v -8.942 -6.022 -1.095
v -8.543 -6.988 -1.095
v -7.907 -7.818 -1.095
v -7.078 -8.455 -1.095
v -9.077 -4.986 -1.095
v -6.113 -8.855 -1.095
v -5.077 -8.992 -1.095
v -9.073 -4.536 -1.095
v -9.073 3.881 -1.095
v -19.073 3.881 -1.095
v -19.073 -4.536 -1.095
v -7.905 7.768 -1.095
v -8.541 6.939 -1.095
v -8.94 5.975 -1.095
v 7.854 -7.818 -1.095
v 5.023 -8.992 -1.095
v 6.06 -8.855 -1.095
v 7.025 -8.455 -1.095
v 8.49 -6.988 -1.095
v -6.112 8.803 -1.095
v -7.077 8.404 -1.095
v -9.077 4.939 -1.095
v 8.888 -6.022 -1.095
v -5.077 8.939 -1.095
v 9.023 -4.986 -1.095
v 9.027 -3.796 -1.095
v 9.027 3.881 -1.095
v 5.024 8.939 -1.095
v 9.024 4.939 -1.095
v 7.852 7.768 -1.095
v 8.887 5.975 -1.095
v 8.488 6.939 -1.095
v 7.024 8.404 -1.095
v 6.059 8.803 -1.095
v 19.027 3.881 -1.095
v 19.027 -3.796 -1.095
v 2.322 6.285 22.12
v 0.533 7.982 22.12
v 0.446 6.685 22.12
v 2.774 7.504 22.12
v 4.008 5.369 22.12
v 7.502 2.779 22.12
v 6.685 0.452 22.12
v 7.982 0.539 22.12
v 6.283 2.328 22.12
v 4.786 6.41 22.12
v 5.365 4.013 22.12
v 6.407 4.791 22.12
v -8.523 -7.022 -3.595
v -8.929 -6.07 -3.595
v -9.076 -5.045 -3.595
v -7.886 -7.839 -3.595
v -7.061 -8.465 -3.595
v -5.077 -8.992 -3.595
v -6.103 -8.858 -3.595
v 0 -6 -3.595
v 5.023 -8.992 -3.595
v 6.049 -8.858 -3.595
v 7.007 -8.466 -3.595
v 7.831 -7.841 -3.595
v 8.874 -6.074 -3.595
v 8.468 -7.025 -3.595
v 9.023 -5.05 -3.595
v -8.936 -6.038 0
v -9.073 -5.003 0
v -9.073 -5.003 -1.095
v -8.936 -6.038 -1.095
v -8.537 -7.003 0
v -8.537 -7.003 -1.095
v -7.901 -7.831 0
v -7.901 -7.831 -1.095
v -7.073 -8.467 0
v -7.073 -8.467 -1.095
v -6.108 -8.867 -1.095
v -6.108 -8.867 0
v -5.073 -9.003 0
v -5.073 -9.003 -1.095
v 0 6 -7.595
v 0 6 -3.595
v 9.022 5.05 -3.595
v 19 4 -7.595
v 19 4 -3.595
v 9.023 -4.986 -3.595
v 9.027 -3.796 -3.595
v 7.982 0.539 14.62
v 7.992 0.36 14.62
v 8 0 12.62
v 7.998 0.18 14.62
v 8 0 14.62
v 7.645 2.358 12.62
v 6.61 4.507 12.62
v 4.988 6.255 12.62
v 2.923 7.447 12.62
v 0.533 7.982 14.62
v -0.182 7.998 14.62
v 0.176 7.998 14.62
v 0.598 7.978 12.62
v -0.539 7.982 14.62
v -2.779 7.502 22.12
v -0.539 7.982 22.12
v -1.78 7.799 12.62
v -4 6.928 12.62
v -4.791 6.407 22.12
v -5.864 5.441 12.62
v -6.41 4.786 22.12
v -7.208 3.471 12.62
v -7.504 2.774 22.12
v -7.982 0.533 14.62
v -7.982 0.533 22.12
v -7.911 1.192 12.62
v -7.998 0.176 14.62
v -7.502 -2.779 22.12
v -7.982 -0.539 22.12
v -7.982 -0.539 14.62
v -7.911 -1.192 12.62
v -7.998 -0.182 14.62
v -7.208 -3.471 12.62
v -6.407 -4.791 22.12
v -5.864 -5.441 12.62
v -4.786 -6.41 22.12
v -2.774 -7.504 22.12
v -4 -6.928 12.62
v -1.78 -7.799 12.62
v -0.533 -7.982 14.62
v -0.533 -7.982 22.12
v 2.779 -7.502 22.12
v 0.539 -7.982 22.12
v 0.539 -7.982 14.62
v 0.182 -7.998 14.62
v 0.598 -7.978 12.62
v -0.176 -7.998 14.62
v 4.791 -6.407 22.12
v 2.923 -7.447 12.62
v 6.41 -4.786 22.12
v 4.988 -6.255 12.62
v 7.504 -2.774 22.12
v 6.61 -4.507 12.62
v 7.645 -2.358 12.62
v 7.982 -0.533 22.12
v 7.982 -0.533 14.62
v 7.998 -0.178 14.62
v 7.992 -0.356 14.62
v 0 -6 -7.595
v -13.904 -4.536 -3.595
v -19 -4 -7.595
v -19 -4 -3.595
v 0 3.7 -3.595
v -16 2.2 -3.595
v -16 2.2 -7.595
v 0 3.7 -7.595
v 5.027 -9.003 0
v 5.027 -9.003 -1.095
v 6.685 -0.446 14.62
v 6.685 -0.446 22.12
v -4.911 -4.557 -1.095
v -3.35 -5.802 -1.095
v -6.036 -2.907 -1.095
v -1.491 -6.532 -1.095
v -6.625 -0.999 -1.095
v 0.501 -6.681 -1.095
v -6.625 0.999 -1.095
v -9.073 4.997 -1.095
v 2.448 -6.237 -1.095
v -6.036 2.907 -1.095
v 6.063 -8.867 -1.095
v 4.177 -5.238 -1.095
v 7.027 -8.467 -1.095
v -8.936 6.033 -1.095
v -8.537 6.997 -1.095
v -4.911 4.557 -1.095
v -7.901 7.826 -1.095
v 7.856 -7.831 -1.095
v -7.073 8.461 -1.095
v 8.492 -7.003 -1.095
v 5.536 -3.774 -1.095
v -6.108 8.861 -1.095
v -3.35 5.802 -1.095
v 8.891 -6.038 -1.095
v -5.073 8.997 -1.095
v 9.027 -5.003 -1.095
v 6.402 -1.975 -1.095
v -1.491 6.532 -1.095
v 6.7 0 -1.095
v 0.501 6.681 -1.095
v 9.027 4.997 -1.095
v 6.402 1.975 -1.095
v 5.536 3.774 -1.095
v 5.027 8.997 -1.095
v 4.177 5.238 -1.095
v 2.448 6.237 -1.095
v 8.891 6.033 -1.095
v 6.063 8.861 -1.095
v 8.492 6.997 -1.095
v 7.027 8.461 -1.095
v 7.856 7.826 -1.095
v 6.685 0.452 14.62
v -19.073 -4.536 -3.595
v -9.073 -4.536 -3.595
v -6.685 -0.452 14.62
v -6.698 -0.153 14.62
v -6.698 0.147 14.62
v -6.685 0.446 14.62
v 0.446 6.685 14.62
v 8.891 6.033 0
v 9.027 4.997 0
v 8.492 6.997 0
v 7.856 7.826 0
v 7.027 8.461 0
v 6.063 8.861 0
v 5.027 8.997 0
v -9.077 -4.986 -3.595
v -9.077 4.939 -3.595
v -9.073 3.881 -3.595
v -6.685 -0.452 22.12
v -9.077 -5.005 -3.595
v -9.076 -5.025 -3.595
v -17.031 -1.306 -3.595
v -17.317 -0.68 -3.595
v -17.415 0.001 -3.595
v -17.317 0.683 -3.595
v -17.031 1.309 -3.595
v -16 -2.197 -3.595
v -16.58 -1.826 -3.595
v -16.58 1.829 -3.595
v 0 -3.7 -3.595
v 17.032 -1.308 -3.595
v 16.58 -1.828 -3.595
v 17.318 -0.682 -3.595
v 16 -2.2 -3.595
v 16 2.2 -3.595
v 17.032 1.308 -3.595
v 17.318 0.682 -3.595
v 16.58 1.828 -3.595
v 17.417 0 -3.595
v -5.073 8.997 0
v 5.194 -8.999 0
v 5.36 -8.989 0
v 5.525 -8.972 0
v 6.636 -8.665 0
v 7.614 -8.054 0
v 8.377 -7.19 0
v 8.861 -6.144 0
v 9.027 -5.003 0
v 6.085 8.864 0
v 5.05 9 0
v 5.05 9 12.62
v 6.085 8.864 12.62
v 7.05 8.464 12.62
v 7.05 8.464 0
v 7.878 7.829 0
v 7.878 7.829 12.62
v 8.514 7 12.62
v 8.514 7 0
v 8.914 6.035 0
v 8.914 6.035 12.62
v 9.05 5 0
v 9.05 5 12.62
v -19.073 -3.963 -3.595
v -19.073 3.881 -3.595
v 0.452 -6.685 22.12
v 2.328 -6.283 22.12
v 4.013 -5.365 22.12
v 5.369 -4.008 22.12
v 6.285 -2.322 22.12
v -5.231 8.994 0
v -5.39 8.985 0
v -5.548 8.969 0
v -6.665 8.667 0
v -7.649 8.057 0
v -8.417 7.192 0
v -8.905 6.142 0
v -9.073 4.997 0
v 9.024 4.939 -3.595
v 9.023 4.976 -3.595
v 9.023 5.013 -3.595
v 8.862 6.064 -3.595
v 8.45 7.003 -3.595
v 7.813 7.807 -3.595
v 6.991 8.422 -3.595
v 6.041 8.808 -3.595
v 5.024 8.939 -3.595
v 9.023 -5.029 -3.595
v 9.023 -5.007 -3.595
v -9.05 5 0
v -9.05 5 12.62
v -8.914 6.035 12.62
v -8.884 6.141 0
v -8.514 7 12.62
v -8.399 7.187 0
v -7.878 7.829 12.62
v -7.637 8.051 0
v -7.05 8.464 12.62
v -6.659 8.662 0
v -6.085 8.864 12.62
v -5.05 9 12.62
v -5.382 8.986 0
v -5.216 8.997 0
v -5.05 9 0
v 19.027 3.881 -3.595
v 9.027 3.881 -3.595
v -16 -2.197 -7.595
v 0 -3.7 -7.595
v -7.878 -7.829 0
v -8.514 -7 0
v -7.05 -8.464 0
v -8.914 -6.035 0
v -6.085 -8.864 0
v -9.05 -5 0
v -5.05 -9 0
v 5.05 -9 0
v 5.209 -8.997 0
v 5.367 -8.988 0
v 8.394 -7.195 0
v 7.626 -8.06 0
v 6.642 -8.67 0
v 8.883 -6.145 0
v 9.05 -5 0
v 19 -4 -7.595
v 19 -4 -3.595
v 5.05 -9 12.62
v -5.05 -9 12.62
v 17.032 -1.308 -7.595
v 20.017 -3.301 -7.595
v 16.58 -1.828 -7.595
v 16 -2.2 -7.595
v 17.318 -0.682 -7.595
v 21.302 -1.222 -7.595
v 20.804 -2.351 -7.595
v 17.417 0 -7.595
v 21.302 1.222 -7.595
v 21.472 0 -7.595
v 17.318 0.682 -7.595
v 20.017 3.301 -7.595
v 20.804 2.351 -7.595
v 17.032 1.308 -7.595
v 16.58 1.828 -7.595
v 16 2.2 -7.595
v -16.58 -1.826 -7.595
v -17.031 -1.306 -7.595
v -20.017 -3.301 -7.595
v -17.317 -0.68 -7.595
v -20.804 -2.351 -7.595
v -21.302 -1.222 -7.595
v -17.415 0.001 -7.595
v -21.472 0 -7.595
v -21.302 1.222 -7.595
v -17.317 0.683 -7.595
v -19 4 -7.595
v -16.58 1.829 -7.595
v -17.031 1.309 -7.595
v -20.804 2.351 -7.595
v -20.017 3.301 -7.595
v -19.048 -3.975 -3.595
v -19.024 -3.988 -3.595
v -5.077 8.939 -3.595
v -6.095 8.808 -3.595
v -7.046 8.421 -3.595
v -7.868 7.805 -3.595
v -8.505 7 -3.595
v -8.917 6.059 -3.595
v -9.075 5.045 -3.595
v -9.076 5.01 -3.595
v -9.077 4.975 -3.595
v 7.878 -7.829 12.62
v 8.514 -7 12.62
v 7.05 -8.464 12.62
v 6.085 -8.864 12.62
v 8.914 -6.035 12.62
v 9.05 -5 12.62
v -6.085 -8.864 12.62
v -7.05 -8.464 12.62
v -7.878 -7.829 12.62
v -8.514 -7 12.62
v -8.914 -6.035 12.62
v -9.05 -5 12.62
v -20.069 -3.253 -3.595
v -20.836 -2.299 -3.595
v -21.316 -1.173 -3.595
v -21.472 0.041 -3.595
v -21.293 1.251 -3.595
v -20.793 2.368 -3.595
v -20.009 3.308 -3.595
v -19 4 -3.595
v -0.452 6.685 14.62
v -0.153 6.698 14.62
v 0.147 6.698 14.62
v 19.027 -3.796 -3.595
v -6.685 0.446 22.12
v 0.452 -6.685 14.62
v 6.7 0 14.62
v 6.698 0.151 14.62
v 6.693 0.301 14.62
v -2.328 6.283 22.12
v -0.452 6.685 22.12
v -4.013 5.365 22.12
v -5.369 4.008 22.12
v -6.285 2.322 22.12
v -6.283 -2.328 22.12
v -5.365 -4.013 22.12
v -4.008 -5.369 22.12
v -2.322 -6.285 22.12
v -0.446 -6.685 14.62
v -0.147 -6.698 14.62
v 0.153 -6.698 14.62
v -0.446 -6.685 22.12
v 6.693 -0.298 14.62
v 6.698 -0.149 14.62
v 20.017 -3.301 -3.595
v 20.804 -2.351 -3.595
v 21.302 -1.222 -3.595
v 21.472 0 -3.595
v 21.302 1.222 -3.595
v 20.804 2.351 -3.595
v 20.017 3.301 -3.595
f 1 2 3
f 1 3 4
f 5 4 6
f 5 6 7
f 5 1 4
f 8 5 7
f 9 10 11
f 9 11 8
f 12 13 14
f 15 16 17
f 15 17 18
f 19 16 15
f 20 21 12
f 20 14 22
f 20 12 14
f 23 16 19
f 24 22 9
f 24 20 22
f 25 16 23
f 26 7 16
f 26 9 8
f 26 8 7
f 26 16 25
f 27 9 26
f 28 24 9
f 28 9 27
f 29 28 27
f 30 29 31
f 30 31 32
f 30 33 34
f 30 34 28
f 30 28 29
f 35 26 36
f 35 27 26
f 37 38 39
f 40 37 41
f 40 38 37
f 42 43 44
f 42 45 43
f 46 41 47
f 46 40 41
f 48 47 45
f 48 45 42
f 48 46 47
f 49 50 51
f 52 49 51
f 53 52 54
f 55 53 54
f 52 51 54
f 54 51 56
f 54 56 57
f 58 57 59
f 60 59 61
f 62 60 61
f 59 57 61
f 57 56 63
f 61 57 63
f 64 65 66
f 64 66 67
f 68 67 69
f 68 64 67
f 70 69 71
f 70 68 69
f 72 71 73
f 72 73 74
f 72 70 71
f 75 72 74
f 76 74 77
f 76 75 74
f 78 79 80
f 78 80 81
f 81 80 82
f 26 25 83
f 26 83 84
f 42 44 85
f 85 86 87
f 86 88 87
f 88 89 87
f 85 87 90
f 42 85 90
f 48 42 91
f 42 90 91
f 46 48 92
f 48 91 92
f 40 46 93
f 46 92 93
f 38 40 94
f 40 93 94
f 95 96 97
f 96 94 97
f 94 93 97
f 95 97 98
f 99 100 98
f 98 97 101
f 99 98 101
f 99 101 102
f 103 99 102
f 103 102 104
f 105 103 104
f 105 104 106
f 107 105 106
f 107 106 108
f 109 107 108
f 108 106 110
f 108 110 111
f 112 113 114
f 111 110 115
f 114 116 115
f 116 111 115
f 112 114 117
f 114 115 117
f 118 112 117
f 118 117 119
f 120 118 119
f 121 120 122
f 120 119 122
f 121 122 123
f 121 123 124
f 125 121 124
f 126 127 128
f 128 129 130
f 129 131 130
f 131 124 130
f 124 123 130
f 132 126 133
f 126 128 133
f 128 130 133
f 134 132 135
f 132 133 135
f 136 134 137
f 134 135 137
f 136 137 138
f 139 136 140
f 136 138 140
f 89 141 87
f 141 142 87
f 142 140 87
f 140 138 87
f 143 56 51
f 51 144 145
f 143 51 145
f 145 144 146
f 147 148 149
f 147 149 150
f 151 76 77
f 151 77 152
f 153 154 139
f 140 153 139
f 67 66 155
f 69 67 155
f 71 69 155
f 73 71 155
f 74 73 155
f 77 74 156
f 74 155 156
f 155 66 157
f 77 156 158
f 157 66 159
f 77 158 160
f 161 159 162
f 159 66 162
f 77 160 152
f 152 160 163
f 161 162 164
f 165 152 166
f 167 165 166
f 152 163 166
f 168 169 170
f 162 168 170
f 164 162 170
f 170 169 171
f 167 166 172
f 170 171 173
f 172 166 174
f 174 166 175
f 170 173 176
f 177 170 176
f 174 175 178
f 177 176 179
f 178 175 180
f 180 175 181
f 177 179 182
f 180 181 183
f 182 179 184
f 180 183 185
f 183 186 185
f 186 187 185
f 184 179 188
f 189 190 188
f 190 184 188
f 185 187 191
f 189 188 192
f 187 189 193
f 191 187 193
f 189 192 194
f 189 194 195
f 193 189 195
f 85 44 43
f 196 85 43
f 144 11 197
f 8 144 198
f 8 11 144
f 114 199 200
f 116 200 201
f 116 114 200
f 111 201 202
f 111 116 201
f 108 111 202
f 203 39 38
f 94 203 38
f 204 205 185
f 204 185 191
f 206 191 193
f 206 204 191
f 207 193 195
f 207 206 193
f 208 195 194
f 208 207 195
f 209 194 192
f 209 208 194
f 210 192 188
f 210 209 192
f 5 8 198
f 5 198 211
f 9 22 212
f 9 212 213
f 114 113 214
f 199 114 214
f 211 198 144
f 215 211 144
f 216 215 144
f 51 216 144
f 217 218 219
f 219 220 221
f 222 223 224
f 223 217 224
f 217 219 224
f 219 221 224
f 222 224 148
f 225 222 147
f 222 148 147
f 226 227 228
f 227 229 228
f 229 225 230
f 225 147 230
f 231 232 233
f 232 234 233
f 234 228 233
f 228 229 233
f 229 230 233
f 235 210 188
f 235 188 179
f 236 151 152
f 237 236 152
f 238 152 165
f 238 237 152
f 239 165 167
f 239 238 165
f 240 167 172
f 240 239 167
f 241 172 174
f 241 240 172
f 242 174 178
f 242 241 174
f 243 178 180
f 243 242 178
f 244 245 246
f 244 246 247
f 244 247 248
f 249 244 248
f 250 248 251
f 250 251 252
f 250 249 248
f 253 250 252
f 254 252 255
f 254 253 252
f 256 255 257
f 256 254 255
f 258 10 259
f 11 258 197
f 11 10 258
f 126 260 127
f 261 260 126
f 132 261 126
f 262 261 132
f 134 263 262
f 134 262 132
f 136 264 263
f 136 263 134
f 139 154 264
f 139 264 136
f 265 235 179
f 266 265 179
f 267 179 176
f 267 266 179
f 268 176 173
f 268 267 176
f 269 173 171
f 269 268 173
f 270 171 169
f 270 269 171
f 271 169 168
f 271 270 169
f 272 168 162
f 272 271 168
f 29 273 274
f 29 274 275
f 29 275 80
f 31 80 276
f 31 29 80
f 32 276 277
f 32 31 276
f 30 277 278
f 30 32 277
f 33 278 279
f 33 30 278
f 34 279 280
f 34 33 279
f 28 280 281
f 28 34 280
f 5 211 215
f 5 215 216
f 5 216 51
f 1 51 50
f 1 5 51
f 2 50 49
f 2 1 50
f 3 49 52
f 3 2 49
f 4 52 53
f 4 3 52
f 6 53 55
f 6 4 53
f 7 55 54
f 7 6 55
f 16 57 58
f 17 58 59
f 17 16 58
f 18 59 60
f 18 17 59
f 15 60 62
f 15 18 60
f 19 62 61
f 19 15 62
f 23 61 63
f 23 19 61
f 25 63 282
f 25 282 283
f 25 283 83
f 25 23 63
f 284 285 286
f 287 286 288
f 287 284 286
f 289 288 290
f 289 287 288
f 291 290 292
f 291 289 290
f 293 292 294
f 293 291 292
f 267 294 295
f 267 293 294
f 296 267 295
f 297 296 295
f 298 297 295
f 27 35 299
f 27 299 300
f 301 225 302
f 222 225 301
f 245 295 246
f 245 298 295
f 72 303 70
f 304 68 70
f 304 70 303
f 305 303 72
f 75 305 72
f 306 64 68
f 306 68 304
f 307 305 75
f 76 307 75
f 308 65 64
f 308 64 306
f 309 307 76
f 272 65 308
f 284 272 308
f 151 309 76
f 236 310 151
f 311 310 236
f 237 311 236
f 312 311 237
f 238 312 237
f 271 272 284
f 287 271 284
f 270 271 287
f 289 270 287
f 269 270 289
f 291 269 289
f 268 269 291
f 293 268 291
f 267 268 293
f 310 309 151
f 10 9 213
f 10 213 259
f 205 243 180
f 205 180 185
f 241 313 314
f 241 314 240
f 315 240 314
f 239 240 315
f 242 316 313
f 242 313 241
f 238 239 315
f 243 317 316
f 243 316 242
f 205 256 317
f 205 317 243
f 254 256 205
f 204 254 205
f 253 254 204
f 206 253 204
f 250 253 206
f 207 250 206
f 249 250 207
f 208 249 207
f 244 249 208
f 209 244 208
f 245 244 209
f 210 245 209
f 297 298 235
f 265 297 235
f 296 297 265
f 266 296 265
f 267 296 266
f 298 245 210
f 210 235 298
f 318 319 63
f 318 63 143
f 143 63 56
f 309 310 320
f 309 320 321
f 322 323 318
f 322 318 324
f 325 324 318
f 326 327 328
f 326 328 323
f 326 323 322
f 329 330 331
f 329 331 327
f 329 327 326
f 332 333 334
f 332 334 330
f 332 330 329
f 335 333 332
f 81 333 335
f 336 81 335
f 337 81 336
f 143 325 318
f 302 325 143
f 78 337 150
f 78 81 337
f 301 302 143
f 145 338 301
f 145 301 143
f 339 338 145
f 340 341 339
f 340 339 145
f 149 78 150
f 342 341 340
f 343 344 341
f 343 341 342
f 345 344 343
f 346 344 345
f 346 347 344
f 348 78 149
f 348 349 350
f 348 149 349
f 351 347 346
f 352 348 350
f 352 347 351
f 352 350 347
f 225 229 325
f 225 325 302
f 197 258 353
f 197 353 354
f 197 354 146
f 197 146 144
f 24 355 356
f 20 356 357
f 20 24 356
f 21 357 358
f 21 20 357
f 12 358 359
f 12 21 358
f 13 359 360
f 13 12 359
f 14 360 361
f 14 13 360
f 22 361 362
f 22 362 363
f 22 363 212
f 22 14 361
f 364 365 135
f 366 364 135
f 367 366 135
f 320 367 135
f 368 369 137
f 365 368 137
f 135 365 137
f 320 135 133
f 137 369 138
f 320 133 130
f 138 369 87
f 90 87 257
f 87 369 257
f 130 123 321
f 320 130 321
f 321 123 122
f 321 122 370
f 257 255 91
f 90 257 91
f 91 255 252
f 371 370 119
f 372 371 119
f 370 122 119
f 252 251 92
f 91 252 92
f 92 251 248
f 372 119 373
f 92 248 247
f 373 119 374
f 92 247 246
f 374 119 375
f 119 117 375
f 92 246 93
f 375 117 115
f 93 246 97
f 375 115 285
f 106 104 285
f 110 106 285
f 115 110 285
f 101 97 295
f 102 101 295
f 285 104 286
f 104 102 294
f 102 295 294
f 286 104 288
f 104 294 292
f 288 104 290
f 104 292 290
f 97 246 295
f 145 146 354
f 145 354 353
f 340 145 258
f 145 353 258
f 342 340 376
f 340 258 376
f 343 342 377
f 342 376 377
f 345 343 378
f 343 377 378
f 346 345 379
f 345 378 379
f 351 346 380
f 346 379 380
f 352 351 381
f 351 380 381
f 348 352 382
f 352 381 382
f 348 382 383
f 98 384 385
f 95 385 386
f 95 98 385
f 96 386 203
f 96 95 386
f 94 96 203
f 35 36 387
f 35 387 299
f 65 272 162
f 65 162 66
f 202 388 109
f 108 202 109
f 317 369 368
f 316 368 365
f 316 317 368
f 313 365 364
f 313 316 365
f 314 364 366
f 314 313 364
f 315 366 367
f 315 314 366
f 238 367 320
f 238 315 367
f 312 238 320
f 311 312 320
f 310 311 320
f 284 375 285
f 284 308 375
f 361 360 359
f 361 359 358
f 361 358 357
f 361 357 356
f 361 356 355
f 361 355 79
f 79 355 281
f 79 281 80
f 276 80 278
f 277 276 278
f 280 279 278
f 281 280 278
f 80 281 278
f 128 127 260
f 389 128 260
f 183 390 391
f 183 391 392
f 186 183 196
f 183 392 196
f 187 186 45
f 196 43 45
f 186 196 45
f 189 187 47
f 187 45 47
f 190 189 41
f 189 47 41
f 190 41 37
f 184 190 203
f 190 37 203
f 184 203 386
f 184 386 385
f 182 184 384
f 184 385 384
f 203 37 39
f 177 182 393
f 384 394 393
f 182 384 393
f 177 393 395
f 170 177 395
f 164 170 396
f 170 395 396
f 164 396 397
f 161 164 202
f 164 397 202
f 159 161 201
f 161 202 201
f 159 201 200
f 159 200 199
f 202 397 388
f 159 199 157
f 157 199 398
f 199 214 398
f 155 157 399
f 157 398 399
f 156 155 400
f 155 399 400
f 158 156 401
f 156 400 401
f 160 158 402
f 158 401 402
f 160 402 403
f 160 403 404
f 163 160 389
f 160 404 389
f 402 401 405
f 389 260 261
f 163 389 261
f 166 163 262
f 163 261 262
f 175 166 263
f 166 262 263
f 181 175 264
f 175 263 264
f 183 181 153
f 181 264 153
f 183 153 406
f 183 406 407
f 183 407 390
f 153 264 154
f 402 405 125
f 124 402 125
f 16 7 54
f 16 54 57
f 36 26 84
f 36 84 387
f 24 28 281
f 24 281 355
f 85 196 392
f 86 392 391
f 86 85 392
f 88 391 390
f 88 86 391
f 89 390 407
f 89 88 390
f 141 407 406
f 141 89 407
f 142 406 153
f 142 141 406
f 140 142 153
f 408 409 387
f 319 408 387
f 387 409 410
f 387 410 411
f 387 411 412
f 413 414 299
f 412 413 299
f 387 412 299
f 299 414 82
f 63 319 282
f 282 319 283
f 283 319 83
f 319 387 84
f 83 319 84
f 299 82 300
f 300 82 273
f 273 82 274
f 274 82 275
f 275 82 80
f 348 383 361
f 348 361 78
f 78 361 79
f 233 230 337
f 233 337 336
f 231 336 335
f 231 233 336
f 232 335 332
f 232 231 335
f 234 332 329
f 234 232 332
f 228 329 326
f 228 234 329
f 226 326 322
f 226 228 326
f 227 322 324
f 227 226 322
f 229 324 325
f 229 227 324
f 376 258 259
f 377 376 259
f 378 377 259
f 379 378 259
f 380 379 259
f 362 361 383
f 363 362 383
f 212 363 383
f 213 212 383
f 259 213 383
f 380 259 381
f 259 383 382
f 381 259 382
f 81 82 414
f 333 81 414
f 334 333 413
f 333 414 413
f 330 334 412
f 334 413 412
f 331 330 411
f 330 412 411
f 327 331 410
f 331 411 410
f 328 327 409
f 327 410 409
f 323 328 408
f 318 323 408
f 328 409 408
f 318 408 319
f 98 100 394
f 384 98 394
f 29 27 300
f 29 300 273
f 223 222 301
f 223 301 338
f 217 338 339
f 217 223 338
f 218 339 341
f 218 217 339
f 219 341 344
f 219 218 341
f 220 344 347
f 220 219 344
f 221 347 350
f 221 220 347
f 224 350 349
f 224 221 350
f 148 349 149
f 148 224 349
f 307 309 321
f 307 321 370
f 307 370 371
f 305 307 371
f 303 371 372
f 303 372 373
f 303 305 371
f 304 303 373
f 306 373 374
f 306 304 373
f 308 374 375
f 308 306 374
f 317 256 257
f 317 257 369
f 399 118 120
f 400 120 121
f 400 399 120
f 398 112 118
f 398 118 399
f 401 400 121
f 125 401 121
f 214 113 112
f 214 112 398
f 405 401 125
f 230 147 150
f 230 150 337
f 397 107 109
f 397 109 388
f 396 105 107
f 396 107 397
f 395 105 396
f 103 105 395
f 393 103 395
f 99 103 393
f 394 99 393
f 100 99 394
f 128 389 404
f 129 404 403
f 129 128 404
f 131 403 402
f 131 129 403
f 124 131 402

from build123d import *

# Parameters (mm, degrees)
BOSS_EXTRUDE1_DEPTH = 2
BOSS_EXTRUDE2_DEPTH = 11.02
BOSS_EXTRUDE3_DEPTH = 1.6
SKETCH4_R           = 8
BOSS_EXTRUDE4_DEPTH = 9.5
SKETCH5_R           = 6.65
CUT_EXTRUDE1_DEPTH  = 20
BOSS_EXTRUDE5_DEPTH = 1.095
SKETCH13_R          = 6.7
CUT_EXTRUDE3_DEPTH  = 30
CUT_EXTRUDE4_DEPTH  = 7.5
CIRPATTERN2_COUNT   = 4
BOSS_EXTRUDE6_DEPTH = 2.5
BOSS_EXTRUDE7_DEPTH = 4


with BuildPart() as part:
    # Sketch1 → Boss-Extrude1 (new body)
    with BuildSketch(Plane.XY):
        with BuildLine():
            Line((-5.05, 9.000108401), (5.05, 9.000108401))
            ThreePointArc((5.05, 9.000108401), (7.878427125, 7.828535526), (9.05, 5.000108401))
            Line((9.05, 5.000108401), (9.05, -5.000108401))
            ThreePointArc((9.05, -5.000108401), (7.878427125, -7.828535526), (5.05, -9.000108401))
            Line((5.05, -9.000108401), (-5.05, -9.000108401))
            ThreePointArc((-5.05, -9.000108401), (-7.878427125, -7.828535526), (-9.05, -5.000108401))
            Line((-9.05, -5.000108401), (-9.05, 5.000108401))
            ThreePointArc((-9.05, 5.000108401), (-7.878427125, 7.828535526), (-5.05, 9.000108401))
        make_face()
    extrude(amount=BOSS_EXTRUDE1_DEPTH)

    # Sketch2 → Boss-Extrude2 (add)
    with BuildSketch(Plane.XY):
        with BuildLine():
            Line((-5.05, 9.000108401), (5.05, 9.000108401))
            ThreePointArc((5.05, 9.000108401), (7.878427125, 7.828535526), (9.05, 5.000108401))
            Line((9.05, 5.000108401), (9.05, -5.000108401))
            ThreePointArc((9.05, -5.000108401), (7.878427125, -7.828535526), (5.05, -9.000108401))
            Line((5.05, -9.000108401), (-5.05, -9.000108401))
            ThreePointArc((-5.05, -9.000108401), (-7.878427125, -7.828535526), (-9.05, -5.000108401))
            Line((-9.05, -5.000108401), (-9.05, 5.000108401))
            ThreePointArc((-9.05, 5.000108401), (-7.878427125, 7.828535526), (-5.05, 9.000108401))
        make_face()
    extrude(amount=BOSS_EXTRUDE2_DEPTH)

    # Sketch3 → Boss-Extrude3 (add)
    with BuildSketch(Plane.XY.offset(11.02)):
        with BuildLine():
            Line((-5.05, 9.000108401), (5.05, 9.000108401))
            ThreePointArc((5.05, 9.000108401), (7.878427125, 7.828535526), (9.05, 5.000108401))
            Line((9.05, 5.000108401), (9.05, -5.000108401))
            ThreePointArc((9.05, -5.000108401), (7.878427125, -7.828535526), (5.05, -9.000108401))
            Line((5.05, -9.000108401), (-5.05, -9.000108401))
            ThreePointArc((-5.05, -9.000108401), (-7.878427125, -7.828535526), (-9.05, -5.000108401))
            Line((-9.05, -5.000108401), (-9.05, 5.000108401))
            ThreePointArc((-9.05, 5.000108401), (-7.878427125, 7.828535526), (-5.05, 9.000108401))
        make_face()
    extrude(amount=BOSS_EXTRUDE3_DEPTH)

    # Sketch4 → Boss-Extrude4 (add)
    with BuildSketch(Plane.XY.offset(12.62)):
        Circle(SKETCH4_R)
    extrude(amount=BOSS_EXTRUDE4_DEPTH)

    # Sketch5 → Cut-Extrude1 (cut)
    with BuildSketch(Plane.XY.offset(12.62)):
        Circle(SKETCH5_R)
    extrude(amount=CUT_EXTRUDE1_DEPTH, mode=Mode.SUBTRACT)

    # Sketch12 → Boss-Extrude5 (add)
    with BuildSketch(Plane(origin=(0, 0, 0), x_dir=(-1, 0, 0), z_dir=(0, 0, -1))):
        with BuildLine():
            Line((-5.027404416, 8.997340309), (5.072595584, 8.997340309))
            ThreePointArc((5.072595584, 8.997340309), (7.901022709, 7.825767433), (9.072595584, 4.997340309))
            Line((9.072595584, 4.997340309), (9.072595584, -5.002876493))
            ThreePointArc((9.072595584, -5.002876493), (7.901022709, -7.831303618), (5.072595584, -9.002876493))
            Line((5.072595584, -9.002876493), (-5.027404416, -9.002876493))
            ThreePointArc((-5.027404416, -9.002876493), (-7.85583154, -7.831303618), (-9.027404416, -5.002876493))
            Line((-9.027404416, -5.002876493), (-9.027404416, 4.997340309))
            ThreePointArc((-9.027404416, 4.997340309), (-7.85583154, 7.825767433), (-5.027404416, 8.997340309))
        make_face()
    extrude(amount=BOSS_EXTRUDE5_DEPTH)

    # Sketch13 → Cut-Extrude3 (cut, symmetric)
    with BuildSketch(Plane.XY):
        Circle(SKETCH13_R)
    extrude(amount=CUT_EXTRUDE3_DEPTH, both=True, mode=Mode.SUBTRACT)

    # Sketch15 → Cut-Extrude4 (cut)
    with BuildSketch(Plane.XY.offset(22.12)):
        Polygon((-0.552830798, 8.187091014), (-0.002830798, 0.003314653), (0.547169202, 8.187091014), (0.617169202, 9.000108401), (-0.626042329, 9.000108401), align=None)
    cut_extrude4 = extrude(amount=-CUT_EXTRUDE4_DEPTH, mode=Mode.SUBTRACT)

    # CirPattern2: Cut-Extrude4 ×4 about axis
    cirpattern2_axis = Axis((0, 0, 0), (0, 0, 1))
    for i in range(1, CIRPATTERN2_COUNT):
        add(cut_extrude4.rotate(cirpattern2_axis, i * 360 / CIRPATTERN2_COUNT), mode=Mode.SUBTRACT)


with BuildPart() as body_2:
    # Sketch16 → Boss-Extrude6 (new body)
    with BuildSketch(Plane(origin=(0, 0, -1.095), x_dir=(-1, 0, 0), z_dir=(0, 0, -1))):
        with BuildLine():
            Line((-5.0235757, 8.939451881), (5.076696464, 8.939451881))
            ThreePointArc((5.076696464, 8.939451881), (7.905123589, 7.767879006), (9.076696464, 4.939451881))
            Line((9.076696464, 4.939451881), (9.072595584, 3.880790969))
            Line((9.072595584, 3.880790969), (19.072595584, 3.880790969))
            Line((19.072595584, 3.880790969), (19.072595584, -4.536431038))
            Line((19.072595584, -4.536431038), (9.072595584, -4.536431038))
            Line((9.072595584, -4.536431038), (9.076550984, -4.98570964))
            ThreePointArc((9.076550984, -4.98570964), (7.907149741, -7.818099531), (5.076555683, -8.991841001))
            Line((5.076555683, -8.991841001), (-5.023434919, -8.991841001))
            ThreePointArc((-5.023434919, -8.991841001), (-7.854028977, -7.818099531), (-9.02343022, -4.98570964))
            Line((-9.02343022, -4.98570964), (-9.027404416, -3.796455477))
            Line((-9.027404416, -3.796455477), (-19.027404416, -3.796455477))
            Line((-19.027404416, -3.796455477), (-19.027404416, 3.880790969))
            Line((-19.027404416, 3.880790969), (-9.027404416, 3.880790969))
            Line((-9.027404416, 3.880790969), (-9.0235757, 4.939451881))
            ThreePointArc((-9.0235757, 4.939451881), (-7.852002825, 7.767879006), (-5.0235757, 8.939451881))
        make_face()
    extrude(amount=BOSS_EXTRUDE6_DEPTH)

    # Sketch17 → Boss-Extrude7 (add)
    with BuildSketch(Plane(origin=(0, 0, -3.595), x_dir=(-1, 0, 0), z_dir=(0, 0, -1))):
        with BuildLine():
            Line((0, 6), (-19, 4))
            ThreePointArc((-19, 4), (-21.472135955, 0), (-19, -4))
            Line((-19, -4), (0, -6))
            Line((0, -6), (19, -4))
            ThreePointArc((19, -4), (21.472135955, 0), (19, 4))
            Line((19, 4), (0, 6))
        make_face()
        with BuildLine():
            Line((0, 3.7), (-16, 2.2))
            ThreePointArc((-16, 2.2), (-17.416609195, 0), (-16, -2.2))
            Line((-16, -2.2), (0, -3.7))
            Line((0, -3.7), (16, -2.197468551))
            ThreePointArc((16, -2.197468551), (17.415456978, 0.001265724), (16, 2.2))
            Line((16, 2.2), (0, 3.7))
        make_face(mode=Mode.SUBTRACT)
    extrude(amount=BOSS_EXTRUDE7_DEPTH)


solid = Compound([part.part, body_2.part])
